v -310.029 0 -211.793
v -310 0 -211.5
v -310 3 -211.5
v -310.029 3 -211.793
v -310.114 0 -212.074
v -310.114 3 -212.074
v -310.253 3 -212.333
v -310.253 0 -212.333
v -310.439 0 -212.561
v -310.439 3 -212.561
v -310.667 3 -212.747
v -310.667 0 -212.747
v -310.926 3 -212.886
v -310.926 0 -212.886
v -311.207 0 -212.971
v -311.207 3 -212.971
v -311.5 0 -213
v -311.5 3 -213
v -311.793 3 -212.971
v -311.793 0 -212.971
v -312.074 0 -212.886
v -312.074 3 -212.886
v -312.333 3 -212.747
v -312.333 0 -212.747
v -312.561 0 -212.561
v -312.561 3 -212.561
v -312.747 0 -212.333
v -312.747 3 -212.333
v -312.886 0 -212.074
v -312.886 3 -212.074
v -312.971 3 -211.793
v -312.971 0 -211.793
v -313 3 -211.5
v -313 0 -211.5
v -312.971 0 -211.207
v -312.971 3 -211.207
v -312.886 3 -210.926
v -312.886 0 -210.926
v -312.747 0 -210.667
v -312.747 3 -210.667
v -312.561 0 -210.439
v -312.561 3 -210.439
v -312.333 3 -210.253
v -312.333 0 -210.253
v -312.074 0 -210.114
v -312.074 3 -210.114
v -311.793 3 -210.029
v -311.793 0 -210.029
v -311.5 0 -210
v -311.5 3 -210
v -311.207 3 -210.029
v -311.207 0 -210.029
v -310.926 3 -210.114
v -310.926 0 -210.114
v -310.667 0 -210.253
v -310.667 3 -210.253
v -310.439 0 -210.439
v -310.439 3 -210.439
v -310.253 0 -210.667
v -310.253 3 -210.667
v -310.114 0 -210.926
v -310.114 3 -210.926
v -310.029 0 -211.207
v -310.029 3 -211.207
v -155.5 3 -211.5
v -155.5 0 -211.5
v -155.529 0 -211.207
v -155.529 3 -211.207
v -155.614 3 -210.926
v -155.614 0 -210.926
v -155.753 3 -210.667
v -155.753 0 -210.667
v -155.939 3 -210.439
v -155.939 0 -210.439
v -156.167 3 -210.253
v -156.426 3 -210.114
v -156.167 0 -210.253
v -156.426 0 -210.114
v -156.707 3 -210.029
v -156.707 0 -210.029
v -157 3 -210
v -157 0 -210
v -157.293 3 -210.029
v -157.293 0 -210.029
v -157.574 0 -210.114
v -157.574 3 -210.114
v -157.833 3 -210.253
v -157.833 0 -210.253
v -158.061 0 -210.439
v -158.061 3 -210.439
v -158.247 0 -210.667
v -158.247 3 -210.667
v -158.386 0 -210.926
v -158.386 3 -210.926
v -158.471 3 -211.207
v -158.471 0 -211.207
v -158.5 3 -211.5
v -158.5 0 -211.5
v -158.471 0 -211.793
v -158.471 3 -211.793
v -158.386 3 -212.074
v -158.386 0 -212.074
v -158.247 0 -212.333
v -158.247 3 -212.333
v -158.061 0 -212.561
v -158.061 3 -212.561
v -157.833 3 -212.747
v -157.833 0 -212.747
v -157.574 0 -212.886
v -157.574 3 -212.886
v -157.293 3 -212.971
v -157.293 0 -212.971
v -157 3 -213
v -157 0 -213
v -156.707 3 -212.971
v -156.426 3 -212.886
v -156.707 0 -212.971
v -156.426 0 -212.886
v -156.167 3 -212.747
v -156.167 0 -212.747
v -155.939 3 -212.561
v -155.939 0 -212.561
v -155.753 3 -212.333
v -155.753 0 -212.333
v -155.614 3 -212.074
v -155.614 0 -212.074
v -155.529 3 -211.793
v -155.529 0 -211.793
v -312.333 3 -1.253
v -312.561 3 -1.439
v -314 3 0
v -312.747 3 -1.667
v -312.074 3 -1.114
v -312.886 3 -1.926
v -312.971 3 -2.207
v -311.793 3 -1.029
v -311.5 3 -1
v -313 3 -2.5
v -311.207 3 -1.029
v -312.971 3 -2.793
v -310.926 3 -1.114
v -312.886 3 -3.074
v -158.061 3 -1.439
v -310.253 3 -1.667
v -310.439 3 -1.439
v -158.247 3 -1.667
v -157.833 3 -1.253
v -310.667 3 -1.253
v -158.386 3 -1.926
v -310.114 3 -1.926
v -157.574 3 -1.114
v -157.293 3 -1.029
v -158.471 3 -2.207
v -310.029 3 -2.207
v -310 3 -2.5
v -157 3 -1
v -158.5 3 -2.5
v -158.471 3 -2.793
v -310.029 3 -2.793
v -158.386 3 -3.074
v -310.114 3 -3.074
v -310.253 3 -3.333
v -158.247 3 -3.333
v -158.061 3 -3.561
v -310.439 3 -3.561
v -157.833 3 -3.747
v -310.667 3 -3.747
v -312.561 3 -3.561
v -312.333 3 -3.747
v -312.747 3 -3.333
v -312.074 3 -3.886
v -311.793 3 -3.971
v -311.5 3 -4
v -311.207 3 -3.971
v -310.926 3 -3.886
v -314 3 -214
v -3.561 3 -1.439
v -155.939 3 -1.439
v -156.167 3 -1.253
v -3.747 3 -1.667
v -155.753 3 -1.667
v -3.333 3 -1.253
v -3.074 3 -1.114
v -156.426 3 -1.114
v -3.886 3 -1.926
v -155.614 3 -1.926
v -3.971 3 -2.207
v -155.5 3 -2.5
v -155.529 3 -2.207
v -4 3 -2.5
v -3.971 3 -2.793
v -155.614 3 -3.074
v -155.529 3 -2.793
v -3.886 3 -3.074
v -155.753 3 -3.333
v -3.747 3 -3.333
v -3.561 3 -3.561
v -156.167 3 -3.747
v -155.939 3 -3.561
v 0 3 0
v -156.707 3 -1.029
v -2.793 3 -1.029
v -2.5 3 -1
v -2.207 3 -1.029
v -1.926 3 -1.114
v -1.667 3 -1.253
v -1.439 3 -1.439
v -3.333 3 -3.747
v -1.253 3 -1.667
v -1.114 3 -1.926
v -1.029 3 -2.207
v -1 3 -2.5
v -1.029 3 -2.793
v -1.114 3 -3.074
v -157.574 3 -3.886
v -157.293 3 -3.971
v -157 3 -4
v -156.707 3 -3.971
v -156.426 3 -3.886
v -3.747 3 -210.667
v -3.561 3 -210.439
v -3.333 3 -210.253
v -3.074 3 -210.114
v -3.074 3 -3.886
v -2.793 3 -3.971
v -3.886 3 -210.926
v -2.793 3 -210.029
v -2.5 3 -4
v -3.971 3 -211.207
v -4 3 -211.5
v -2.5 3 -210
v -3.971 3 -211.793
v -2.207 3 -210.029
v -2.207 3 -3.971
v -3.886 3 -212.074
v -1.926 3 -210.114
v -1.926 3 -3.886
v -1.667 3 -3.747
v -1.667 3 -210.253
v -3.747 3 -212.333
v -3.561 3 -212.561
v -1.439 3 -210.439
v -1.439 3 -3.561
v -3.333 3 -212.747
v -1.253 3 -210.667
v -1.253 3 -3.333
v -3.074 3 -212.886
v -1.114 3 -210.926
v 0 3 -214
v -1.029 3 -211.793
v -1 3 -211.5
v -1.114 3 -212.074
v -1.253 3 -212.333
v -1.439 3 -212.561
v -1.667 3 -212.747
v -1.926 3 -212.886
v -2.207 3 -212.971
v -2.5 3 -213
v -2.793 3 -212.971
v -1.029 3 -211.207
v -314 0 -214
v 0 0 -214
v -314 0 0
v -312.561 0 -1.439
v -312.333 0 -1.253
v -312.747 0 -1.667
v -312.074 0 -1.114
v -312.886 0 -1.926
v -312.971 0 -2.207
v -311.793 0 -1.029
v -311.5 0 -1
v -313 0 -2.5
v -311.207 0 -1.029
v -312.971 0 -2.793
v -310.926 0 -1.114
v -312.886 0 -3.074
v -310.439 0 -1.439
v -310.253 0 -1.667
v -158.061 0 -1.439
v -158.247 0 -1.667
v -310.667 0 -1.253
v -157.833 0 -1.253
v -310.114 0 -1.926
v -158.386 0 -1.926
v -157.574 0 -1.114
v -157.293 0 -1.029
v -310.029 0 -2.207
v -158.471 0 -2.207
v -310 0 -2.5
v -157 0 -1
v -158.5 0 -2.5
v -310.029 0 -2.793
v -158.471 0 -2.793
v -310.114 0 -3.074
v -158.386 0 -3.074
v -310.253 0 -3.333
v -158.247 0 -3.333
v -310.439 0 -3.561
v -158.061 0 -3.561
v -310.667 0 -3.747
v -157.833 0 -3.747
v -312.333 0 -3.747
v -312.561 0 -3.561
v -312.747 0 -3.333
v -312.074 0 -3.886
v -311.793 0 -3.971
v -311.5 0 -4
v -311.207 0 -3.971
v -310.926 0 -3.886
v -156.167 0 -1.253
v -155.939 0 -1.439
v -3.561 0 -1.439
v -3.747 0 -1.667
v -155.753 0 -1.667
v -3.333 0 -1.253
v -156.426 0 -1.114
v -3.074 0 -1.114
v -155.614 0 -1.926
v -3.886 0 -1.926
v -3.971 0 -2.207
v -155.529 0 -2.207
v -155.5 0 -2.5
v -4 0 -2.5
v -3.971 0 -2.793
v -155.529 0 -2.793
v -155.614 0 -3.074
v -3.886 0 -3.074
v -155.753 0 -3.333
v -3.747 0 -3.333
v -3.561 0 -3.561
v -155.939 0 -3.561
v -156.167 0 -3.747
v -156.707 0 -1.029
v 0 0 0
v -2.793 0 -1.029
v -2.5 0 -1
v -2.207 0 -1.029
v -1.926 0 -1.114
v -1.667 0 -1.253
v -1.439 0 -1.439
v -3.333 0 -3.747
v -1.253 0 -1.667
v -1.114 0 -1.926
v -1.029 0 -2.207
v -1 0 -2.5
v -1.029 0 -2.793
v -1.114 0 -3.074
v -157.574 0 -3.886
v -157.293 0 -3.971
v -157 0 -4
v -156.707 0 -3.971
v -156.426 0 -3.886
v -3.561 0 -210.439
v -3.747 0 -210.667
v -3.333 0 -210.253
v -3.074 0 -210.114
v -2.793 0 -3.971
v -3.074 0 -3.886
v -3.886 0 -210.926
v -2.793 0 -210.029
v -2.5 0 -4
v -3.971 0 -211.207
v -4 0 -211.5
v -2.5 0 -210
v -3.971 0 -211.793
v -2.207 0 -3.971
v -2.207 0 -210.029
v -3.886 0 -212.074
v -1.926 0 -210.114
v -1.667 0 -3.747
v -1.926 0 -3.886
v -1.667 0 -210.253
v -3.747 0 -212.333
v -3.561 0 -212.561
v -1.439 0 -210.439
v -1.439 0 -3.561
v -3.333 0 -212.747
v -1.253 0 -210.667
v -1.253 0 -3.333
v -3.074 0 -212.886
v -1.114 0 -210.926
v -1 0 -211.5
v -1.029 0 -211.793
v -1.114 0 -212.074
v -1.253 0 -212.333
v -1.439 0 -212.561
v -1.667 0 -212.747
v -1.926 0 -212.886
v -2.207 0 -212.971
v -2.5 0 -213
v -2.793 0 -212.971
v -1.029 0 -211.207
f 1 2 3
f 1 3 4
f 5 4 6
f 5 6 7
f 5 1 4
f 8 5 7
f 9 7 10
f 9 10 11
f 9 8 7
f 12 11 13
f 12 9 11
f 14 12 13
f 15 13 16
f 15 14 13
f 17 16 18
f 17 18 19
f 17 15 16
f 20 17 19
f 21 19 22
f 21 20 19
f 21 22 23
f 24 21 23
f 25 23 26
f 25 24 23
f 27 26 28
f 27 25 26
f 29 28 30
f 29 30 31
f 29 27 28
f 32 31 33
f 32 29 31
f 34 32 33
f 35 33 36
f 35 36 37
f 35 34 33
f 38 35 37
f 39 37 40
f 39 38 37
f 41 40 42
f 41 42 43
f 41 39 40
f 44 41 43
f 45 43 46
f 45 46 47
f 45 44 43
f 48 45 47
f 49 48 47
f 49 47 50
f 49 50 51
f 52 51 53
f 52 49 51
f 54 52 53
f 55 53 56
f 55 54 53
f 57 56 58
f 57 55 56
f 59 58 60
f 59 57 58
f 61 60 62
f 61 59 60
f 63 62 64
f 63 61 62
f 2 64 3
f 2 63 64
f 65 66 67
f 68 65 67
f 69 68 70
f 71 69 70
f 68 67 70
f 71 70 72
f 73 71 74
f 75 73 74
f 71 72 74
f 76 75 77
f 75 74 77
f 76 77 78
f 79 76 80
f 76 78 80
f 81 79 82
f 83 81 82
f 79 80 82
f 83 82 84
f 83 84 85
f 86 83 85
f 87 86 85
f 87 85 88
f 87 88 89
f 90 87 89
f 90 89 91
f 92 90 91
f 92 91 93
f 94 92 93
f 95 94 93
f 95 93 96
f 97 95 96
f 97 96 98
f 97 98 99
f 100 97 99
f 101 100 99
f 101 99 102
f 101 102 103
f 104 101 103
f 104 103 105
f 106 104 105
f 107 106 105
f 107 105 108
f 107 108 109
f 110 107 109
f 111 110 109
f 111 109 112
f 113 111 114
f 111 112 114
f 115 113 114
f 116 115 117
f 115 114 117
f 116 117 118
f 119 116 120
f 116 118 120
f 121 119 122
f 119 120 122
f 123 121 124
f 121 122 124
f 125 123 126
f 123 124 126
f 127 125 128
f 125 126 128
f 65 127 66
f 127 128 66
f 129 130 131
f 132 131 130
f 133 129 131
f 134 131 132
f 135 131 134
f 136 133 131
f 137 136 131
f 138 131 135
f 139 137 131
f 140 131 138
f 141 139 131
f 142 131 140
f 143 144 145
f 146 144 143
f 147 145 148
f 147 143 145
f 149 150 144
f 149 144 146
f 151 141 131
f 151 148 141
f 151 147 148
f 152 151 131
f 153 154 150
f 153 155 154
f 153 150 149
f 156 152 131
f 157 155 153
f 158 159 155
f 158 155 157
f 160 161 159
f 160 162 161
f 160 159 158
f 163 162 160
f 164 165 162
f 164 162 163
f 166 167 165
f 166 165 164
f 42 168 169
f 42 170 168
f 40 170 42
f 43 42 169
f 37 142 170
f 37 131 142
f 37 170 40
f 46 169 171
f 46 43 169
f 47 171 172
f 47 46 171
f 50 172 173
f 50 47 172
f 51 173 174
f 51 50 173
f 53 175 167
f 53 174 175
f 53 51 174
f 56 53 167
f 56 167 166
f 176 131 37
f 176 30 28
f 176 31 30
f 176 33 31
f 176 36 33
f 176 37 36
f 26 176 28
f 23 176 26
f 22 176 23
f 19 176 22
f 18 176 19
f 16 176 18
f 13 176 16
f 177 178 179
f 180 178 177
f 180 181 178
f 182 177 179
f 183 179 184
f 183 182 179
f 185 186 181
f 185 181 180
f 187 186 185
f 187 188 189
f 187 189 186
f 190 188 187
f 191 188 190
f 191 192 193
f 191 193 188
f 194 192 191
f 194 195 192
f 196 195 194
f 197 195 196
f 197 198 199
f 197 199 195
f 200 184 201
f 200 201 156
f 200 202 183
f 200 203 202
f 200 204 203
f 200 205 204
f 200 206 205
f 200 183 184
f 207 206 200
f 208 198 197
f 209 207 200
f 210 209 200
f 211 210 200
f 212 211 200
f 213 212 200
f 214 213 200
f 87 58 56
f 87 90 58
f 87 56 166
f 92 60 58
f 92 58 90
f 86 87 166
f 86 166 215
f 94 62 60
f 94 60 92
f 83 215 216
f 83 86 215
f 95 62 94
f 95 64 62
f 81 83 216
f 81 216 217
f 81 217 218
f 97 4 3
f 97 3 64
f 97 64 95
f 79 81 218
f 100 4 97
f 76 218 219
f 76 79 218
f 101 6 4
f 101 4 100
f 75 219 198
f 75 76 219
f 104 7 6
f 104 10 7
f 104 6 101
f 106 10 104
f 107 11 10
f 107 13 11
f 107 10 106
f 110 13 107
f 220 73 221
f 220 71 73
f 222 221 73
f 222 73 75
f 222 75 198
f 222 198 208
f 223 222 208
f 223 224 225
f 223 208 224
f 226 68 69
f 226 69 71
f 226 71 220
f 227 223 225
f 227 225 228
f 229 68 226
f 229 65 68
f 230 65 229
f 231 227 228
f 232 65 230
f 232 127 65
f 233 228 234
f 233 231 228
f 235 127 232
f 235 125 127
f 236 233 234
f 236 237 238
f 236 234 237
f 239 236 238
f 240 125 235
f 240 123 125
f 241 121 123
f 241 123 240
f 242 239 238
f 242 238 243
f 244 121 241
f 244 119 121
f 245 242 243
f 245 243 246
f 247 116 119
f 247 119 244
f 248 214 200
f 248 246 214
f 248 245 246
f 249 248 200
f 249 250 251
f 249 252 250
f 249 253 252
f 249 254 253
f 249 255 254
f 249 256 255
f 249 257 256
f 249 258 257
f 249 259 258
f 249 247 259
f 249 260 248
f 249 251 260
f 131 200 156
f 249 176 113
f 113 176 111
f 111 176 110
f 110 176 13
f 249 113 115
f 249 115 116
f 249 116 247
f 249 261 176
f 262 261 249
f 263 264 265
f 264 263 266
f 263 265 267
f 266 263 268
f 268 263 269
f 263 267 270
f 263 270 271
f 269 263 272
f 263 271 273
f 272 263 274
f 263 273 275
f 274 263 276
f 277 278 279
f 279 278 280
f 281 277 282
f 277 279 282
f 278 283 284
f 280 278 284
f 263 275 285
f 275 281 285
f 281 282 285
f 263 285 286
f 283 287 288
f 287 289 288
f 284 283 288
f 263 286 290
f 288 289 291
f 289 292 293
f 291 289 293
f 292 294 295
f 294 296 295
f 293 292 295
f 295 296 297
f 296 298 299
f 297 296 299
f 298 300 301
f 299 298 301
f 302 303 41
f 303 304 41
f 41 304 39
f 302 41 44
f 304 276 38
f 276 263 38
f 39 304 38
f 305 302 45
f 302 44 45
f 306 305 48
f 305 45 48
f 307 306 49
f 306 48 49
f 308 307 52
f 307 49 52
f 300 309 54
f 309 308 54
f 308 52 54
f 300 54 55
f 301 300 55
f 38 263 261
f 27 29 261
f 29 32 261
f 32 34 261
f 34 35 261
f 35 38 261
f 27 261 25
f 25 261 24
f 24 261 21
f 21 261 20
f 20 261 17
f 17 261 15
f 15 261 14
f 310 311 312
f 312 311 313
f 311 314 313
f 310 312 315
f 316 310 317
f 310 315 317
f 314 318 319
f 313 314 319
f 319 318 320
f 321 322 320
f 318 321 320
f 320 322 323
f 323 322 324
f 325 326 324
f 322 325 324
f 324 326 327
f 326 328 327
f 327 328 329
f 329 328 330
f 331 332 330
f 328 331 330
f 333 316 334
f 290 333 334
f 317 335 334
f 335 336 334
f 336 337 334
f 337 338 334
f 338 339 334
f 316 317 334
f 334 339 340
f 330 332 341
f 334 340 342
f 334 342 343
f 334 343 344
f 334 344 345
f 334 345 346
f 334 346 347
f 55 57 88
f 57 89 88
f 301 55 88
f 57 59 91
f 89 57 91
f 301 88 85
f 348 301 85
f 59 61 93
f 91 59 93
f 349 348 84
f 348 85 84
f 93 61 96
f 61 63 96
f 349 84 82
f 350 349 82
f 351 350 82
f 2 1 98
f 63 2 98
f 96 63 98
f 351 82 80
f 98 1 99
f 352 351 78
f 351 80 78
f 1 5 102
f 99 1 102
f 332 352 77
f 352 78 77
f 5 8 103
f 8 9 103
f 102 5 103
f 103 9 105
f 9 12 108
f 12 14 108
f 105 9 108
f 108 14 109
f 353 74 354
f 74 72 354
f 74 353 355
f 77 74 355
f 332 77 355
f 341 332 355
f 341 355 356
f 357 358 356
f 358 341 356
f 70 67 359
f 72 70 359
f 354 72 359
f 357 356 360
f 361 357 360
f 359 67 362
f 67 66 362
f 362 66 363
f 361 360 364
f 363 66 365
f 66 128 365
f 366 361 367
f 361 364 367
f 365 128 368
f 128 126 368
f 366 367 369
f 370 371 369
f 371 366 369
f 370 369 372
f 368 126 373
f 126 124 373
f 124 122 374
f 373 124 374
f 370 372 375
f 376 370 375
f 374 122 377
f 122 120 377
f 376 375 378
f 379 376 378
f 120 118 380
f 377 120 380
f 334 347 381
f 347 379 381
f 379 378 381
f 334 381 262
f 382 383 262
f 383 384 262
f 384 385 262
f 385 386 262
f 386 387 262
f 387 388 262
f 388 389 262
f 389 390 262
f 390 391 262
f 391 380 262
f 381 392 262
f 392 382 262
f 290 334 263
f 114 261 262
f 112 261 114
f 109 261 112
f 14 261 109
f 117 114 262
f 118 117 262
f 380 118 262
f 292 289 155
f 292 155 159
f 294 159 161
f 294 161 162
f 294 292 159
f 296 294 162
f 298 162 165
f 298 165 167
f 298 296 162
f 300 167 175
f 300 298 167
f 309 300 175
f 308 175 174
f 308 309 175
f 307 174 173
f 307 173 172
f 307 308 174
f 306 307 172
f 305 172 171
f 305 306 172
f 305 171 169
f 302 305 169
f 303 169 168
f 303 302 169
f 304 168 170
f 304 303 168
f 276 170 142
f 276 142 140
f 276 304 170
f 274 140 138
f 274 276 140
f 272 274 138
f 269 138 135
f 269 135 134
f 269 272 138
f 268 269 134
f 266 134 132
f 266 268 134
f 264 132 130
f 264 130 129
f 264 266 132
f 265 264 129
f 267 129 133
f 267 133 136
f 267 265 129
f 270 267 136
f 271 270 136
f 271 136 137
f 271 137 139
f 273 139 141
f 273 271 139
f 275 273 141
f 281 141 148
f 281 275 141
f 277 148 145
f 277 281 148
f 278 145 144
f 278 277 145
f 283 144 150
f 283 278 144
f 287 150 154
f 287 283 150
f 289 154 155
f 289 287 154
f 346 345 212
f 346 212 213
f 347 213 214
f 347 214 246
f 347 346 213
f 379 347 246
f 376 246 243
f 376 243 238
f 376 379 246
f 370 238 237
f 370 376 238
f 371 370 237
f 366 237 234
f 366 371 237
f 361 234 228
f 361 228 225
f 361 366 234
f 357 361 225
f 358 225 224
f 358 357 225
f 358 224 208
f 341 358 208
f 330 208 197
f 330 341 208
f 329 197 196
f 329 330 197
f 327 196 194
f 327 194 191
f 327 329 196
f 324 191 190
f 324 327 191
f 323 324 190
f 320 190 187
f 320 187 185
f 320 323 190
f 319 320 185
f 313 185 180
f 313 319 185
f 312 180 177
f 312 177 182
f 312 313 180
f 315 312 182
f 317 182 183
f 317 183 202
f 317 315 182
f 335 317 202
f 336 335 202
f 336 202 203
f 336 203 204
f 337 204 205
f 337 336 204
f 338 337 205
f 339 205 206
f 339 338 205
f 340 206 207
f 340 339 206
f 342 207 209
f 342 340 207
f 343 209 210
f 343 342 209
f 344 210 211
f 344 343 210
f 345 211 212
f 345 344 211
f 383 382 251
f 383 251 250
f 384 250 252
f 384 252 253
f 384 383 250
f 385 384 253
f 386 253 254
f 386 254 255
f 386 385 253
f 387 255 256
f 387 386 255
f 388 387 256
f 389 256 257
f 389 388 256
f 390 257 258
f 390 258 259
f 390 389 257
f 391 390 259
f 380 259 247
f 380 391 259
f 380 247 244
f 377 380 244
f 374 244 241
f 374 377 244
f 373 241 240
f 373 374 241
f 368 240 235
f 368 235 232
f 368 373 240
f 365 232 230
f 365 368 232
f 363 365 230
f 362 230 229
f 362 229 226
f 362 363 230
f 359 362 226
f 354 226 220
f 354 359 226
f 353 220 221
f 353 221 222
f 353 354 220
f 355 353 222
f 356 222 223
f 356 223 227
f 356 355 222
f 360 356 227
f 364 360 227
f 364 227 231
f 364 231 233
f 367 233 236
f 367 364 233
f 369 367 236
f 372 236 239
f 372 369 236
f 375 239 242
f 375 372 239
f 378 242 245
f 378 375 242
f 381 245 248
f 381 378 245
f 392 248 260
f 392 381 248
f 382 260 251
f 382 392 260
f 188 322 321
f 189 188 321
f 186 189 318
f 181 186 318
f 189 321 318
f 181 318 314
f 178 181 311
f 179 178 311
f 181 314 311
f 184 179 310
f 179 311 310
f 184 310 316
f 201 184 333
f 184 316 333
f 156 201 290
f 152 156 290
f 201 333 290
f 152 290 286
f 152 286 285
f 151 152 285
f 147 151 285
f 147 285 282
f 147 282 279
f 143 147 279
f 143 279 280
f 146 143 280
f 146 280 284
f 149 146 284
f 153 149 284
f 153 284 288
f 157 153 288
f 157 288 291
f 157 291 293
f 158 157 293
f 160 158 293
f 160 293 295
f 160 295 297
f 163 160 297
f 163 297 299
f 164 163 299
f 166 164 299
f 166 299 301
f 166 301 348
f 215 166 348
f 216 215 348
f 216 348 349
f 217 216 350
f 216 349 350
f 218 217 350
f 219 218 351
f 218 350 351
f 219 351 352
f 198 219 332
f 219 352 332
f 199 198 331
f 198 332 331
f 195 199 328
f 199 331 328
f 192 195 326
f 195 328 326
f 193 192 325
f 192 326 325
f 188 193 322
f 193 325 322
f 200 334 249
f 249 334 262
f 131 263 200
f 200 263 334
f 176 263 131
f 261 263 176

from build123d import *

# Parameters (mm, degrees)
SKETCH1_W           = 314
SKETCH1_H           = 214
SKETCH1_R           = 1.5
BOSS_EXTRUDE1_DEPTH = 3
SKETCH2_R           = 1.5
CUT_EXTRUDE1_DEPTH  = 10


with BuildPart() as part:
    # Sketch1 → Boss-Extrude1 (new body)
    with BuildSketch(Plane(origin=(0, 0, 0), x_dir=(1, 0, 0), z_dir=(0, 1, 0))):
        with Locations((-157, 107)):
            Rectangle(SKETCH1_W, SKETCH1_H)
        with Locations((-311.5, 211.5)):
            Circle(SKETCH1_R, mode=Mode.SUBTRACT)
        with Locations((-311.5, 2.5)):
            Circle(SKETCH1_R, mode=Mode.SUBTRACT)
        with Locations((-2.5, 2.5)):
            Circle(SKETCH1_R, mode=Mode.SUBTRACT)
        with Locations((-2.5, 211.5)):
            Circle(SKETCH1_R, mode=Mode.SUBTRACT)
    extrude(amount=BOSS_EXTRUDE1_DEPTH)

    # Sketch2 → Cut-Extrude1 (cut)
    with BuildSketch(Plane.XZ):
        with Locations((-157, -2.5)):
            Circle(SKETCH2_R)
        with Locations((-157, -211.5)):
            Circle(SKETCH2_R)
    extrude(amount=-CUT_EXTRUDE1_DEPTH, mode=Mode.SUBTRACT)


solid = part.part
